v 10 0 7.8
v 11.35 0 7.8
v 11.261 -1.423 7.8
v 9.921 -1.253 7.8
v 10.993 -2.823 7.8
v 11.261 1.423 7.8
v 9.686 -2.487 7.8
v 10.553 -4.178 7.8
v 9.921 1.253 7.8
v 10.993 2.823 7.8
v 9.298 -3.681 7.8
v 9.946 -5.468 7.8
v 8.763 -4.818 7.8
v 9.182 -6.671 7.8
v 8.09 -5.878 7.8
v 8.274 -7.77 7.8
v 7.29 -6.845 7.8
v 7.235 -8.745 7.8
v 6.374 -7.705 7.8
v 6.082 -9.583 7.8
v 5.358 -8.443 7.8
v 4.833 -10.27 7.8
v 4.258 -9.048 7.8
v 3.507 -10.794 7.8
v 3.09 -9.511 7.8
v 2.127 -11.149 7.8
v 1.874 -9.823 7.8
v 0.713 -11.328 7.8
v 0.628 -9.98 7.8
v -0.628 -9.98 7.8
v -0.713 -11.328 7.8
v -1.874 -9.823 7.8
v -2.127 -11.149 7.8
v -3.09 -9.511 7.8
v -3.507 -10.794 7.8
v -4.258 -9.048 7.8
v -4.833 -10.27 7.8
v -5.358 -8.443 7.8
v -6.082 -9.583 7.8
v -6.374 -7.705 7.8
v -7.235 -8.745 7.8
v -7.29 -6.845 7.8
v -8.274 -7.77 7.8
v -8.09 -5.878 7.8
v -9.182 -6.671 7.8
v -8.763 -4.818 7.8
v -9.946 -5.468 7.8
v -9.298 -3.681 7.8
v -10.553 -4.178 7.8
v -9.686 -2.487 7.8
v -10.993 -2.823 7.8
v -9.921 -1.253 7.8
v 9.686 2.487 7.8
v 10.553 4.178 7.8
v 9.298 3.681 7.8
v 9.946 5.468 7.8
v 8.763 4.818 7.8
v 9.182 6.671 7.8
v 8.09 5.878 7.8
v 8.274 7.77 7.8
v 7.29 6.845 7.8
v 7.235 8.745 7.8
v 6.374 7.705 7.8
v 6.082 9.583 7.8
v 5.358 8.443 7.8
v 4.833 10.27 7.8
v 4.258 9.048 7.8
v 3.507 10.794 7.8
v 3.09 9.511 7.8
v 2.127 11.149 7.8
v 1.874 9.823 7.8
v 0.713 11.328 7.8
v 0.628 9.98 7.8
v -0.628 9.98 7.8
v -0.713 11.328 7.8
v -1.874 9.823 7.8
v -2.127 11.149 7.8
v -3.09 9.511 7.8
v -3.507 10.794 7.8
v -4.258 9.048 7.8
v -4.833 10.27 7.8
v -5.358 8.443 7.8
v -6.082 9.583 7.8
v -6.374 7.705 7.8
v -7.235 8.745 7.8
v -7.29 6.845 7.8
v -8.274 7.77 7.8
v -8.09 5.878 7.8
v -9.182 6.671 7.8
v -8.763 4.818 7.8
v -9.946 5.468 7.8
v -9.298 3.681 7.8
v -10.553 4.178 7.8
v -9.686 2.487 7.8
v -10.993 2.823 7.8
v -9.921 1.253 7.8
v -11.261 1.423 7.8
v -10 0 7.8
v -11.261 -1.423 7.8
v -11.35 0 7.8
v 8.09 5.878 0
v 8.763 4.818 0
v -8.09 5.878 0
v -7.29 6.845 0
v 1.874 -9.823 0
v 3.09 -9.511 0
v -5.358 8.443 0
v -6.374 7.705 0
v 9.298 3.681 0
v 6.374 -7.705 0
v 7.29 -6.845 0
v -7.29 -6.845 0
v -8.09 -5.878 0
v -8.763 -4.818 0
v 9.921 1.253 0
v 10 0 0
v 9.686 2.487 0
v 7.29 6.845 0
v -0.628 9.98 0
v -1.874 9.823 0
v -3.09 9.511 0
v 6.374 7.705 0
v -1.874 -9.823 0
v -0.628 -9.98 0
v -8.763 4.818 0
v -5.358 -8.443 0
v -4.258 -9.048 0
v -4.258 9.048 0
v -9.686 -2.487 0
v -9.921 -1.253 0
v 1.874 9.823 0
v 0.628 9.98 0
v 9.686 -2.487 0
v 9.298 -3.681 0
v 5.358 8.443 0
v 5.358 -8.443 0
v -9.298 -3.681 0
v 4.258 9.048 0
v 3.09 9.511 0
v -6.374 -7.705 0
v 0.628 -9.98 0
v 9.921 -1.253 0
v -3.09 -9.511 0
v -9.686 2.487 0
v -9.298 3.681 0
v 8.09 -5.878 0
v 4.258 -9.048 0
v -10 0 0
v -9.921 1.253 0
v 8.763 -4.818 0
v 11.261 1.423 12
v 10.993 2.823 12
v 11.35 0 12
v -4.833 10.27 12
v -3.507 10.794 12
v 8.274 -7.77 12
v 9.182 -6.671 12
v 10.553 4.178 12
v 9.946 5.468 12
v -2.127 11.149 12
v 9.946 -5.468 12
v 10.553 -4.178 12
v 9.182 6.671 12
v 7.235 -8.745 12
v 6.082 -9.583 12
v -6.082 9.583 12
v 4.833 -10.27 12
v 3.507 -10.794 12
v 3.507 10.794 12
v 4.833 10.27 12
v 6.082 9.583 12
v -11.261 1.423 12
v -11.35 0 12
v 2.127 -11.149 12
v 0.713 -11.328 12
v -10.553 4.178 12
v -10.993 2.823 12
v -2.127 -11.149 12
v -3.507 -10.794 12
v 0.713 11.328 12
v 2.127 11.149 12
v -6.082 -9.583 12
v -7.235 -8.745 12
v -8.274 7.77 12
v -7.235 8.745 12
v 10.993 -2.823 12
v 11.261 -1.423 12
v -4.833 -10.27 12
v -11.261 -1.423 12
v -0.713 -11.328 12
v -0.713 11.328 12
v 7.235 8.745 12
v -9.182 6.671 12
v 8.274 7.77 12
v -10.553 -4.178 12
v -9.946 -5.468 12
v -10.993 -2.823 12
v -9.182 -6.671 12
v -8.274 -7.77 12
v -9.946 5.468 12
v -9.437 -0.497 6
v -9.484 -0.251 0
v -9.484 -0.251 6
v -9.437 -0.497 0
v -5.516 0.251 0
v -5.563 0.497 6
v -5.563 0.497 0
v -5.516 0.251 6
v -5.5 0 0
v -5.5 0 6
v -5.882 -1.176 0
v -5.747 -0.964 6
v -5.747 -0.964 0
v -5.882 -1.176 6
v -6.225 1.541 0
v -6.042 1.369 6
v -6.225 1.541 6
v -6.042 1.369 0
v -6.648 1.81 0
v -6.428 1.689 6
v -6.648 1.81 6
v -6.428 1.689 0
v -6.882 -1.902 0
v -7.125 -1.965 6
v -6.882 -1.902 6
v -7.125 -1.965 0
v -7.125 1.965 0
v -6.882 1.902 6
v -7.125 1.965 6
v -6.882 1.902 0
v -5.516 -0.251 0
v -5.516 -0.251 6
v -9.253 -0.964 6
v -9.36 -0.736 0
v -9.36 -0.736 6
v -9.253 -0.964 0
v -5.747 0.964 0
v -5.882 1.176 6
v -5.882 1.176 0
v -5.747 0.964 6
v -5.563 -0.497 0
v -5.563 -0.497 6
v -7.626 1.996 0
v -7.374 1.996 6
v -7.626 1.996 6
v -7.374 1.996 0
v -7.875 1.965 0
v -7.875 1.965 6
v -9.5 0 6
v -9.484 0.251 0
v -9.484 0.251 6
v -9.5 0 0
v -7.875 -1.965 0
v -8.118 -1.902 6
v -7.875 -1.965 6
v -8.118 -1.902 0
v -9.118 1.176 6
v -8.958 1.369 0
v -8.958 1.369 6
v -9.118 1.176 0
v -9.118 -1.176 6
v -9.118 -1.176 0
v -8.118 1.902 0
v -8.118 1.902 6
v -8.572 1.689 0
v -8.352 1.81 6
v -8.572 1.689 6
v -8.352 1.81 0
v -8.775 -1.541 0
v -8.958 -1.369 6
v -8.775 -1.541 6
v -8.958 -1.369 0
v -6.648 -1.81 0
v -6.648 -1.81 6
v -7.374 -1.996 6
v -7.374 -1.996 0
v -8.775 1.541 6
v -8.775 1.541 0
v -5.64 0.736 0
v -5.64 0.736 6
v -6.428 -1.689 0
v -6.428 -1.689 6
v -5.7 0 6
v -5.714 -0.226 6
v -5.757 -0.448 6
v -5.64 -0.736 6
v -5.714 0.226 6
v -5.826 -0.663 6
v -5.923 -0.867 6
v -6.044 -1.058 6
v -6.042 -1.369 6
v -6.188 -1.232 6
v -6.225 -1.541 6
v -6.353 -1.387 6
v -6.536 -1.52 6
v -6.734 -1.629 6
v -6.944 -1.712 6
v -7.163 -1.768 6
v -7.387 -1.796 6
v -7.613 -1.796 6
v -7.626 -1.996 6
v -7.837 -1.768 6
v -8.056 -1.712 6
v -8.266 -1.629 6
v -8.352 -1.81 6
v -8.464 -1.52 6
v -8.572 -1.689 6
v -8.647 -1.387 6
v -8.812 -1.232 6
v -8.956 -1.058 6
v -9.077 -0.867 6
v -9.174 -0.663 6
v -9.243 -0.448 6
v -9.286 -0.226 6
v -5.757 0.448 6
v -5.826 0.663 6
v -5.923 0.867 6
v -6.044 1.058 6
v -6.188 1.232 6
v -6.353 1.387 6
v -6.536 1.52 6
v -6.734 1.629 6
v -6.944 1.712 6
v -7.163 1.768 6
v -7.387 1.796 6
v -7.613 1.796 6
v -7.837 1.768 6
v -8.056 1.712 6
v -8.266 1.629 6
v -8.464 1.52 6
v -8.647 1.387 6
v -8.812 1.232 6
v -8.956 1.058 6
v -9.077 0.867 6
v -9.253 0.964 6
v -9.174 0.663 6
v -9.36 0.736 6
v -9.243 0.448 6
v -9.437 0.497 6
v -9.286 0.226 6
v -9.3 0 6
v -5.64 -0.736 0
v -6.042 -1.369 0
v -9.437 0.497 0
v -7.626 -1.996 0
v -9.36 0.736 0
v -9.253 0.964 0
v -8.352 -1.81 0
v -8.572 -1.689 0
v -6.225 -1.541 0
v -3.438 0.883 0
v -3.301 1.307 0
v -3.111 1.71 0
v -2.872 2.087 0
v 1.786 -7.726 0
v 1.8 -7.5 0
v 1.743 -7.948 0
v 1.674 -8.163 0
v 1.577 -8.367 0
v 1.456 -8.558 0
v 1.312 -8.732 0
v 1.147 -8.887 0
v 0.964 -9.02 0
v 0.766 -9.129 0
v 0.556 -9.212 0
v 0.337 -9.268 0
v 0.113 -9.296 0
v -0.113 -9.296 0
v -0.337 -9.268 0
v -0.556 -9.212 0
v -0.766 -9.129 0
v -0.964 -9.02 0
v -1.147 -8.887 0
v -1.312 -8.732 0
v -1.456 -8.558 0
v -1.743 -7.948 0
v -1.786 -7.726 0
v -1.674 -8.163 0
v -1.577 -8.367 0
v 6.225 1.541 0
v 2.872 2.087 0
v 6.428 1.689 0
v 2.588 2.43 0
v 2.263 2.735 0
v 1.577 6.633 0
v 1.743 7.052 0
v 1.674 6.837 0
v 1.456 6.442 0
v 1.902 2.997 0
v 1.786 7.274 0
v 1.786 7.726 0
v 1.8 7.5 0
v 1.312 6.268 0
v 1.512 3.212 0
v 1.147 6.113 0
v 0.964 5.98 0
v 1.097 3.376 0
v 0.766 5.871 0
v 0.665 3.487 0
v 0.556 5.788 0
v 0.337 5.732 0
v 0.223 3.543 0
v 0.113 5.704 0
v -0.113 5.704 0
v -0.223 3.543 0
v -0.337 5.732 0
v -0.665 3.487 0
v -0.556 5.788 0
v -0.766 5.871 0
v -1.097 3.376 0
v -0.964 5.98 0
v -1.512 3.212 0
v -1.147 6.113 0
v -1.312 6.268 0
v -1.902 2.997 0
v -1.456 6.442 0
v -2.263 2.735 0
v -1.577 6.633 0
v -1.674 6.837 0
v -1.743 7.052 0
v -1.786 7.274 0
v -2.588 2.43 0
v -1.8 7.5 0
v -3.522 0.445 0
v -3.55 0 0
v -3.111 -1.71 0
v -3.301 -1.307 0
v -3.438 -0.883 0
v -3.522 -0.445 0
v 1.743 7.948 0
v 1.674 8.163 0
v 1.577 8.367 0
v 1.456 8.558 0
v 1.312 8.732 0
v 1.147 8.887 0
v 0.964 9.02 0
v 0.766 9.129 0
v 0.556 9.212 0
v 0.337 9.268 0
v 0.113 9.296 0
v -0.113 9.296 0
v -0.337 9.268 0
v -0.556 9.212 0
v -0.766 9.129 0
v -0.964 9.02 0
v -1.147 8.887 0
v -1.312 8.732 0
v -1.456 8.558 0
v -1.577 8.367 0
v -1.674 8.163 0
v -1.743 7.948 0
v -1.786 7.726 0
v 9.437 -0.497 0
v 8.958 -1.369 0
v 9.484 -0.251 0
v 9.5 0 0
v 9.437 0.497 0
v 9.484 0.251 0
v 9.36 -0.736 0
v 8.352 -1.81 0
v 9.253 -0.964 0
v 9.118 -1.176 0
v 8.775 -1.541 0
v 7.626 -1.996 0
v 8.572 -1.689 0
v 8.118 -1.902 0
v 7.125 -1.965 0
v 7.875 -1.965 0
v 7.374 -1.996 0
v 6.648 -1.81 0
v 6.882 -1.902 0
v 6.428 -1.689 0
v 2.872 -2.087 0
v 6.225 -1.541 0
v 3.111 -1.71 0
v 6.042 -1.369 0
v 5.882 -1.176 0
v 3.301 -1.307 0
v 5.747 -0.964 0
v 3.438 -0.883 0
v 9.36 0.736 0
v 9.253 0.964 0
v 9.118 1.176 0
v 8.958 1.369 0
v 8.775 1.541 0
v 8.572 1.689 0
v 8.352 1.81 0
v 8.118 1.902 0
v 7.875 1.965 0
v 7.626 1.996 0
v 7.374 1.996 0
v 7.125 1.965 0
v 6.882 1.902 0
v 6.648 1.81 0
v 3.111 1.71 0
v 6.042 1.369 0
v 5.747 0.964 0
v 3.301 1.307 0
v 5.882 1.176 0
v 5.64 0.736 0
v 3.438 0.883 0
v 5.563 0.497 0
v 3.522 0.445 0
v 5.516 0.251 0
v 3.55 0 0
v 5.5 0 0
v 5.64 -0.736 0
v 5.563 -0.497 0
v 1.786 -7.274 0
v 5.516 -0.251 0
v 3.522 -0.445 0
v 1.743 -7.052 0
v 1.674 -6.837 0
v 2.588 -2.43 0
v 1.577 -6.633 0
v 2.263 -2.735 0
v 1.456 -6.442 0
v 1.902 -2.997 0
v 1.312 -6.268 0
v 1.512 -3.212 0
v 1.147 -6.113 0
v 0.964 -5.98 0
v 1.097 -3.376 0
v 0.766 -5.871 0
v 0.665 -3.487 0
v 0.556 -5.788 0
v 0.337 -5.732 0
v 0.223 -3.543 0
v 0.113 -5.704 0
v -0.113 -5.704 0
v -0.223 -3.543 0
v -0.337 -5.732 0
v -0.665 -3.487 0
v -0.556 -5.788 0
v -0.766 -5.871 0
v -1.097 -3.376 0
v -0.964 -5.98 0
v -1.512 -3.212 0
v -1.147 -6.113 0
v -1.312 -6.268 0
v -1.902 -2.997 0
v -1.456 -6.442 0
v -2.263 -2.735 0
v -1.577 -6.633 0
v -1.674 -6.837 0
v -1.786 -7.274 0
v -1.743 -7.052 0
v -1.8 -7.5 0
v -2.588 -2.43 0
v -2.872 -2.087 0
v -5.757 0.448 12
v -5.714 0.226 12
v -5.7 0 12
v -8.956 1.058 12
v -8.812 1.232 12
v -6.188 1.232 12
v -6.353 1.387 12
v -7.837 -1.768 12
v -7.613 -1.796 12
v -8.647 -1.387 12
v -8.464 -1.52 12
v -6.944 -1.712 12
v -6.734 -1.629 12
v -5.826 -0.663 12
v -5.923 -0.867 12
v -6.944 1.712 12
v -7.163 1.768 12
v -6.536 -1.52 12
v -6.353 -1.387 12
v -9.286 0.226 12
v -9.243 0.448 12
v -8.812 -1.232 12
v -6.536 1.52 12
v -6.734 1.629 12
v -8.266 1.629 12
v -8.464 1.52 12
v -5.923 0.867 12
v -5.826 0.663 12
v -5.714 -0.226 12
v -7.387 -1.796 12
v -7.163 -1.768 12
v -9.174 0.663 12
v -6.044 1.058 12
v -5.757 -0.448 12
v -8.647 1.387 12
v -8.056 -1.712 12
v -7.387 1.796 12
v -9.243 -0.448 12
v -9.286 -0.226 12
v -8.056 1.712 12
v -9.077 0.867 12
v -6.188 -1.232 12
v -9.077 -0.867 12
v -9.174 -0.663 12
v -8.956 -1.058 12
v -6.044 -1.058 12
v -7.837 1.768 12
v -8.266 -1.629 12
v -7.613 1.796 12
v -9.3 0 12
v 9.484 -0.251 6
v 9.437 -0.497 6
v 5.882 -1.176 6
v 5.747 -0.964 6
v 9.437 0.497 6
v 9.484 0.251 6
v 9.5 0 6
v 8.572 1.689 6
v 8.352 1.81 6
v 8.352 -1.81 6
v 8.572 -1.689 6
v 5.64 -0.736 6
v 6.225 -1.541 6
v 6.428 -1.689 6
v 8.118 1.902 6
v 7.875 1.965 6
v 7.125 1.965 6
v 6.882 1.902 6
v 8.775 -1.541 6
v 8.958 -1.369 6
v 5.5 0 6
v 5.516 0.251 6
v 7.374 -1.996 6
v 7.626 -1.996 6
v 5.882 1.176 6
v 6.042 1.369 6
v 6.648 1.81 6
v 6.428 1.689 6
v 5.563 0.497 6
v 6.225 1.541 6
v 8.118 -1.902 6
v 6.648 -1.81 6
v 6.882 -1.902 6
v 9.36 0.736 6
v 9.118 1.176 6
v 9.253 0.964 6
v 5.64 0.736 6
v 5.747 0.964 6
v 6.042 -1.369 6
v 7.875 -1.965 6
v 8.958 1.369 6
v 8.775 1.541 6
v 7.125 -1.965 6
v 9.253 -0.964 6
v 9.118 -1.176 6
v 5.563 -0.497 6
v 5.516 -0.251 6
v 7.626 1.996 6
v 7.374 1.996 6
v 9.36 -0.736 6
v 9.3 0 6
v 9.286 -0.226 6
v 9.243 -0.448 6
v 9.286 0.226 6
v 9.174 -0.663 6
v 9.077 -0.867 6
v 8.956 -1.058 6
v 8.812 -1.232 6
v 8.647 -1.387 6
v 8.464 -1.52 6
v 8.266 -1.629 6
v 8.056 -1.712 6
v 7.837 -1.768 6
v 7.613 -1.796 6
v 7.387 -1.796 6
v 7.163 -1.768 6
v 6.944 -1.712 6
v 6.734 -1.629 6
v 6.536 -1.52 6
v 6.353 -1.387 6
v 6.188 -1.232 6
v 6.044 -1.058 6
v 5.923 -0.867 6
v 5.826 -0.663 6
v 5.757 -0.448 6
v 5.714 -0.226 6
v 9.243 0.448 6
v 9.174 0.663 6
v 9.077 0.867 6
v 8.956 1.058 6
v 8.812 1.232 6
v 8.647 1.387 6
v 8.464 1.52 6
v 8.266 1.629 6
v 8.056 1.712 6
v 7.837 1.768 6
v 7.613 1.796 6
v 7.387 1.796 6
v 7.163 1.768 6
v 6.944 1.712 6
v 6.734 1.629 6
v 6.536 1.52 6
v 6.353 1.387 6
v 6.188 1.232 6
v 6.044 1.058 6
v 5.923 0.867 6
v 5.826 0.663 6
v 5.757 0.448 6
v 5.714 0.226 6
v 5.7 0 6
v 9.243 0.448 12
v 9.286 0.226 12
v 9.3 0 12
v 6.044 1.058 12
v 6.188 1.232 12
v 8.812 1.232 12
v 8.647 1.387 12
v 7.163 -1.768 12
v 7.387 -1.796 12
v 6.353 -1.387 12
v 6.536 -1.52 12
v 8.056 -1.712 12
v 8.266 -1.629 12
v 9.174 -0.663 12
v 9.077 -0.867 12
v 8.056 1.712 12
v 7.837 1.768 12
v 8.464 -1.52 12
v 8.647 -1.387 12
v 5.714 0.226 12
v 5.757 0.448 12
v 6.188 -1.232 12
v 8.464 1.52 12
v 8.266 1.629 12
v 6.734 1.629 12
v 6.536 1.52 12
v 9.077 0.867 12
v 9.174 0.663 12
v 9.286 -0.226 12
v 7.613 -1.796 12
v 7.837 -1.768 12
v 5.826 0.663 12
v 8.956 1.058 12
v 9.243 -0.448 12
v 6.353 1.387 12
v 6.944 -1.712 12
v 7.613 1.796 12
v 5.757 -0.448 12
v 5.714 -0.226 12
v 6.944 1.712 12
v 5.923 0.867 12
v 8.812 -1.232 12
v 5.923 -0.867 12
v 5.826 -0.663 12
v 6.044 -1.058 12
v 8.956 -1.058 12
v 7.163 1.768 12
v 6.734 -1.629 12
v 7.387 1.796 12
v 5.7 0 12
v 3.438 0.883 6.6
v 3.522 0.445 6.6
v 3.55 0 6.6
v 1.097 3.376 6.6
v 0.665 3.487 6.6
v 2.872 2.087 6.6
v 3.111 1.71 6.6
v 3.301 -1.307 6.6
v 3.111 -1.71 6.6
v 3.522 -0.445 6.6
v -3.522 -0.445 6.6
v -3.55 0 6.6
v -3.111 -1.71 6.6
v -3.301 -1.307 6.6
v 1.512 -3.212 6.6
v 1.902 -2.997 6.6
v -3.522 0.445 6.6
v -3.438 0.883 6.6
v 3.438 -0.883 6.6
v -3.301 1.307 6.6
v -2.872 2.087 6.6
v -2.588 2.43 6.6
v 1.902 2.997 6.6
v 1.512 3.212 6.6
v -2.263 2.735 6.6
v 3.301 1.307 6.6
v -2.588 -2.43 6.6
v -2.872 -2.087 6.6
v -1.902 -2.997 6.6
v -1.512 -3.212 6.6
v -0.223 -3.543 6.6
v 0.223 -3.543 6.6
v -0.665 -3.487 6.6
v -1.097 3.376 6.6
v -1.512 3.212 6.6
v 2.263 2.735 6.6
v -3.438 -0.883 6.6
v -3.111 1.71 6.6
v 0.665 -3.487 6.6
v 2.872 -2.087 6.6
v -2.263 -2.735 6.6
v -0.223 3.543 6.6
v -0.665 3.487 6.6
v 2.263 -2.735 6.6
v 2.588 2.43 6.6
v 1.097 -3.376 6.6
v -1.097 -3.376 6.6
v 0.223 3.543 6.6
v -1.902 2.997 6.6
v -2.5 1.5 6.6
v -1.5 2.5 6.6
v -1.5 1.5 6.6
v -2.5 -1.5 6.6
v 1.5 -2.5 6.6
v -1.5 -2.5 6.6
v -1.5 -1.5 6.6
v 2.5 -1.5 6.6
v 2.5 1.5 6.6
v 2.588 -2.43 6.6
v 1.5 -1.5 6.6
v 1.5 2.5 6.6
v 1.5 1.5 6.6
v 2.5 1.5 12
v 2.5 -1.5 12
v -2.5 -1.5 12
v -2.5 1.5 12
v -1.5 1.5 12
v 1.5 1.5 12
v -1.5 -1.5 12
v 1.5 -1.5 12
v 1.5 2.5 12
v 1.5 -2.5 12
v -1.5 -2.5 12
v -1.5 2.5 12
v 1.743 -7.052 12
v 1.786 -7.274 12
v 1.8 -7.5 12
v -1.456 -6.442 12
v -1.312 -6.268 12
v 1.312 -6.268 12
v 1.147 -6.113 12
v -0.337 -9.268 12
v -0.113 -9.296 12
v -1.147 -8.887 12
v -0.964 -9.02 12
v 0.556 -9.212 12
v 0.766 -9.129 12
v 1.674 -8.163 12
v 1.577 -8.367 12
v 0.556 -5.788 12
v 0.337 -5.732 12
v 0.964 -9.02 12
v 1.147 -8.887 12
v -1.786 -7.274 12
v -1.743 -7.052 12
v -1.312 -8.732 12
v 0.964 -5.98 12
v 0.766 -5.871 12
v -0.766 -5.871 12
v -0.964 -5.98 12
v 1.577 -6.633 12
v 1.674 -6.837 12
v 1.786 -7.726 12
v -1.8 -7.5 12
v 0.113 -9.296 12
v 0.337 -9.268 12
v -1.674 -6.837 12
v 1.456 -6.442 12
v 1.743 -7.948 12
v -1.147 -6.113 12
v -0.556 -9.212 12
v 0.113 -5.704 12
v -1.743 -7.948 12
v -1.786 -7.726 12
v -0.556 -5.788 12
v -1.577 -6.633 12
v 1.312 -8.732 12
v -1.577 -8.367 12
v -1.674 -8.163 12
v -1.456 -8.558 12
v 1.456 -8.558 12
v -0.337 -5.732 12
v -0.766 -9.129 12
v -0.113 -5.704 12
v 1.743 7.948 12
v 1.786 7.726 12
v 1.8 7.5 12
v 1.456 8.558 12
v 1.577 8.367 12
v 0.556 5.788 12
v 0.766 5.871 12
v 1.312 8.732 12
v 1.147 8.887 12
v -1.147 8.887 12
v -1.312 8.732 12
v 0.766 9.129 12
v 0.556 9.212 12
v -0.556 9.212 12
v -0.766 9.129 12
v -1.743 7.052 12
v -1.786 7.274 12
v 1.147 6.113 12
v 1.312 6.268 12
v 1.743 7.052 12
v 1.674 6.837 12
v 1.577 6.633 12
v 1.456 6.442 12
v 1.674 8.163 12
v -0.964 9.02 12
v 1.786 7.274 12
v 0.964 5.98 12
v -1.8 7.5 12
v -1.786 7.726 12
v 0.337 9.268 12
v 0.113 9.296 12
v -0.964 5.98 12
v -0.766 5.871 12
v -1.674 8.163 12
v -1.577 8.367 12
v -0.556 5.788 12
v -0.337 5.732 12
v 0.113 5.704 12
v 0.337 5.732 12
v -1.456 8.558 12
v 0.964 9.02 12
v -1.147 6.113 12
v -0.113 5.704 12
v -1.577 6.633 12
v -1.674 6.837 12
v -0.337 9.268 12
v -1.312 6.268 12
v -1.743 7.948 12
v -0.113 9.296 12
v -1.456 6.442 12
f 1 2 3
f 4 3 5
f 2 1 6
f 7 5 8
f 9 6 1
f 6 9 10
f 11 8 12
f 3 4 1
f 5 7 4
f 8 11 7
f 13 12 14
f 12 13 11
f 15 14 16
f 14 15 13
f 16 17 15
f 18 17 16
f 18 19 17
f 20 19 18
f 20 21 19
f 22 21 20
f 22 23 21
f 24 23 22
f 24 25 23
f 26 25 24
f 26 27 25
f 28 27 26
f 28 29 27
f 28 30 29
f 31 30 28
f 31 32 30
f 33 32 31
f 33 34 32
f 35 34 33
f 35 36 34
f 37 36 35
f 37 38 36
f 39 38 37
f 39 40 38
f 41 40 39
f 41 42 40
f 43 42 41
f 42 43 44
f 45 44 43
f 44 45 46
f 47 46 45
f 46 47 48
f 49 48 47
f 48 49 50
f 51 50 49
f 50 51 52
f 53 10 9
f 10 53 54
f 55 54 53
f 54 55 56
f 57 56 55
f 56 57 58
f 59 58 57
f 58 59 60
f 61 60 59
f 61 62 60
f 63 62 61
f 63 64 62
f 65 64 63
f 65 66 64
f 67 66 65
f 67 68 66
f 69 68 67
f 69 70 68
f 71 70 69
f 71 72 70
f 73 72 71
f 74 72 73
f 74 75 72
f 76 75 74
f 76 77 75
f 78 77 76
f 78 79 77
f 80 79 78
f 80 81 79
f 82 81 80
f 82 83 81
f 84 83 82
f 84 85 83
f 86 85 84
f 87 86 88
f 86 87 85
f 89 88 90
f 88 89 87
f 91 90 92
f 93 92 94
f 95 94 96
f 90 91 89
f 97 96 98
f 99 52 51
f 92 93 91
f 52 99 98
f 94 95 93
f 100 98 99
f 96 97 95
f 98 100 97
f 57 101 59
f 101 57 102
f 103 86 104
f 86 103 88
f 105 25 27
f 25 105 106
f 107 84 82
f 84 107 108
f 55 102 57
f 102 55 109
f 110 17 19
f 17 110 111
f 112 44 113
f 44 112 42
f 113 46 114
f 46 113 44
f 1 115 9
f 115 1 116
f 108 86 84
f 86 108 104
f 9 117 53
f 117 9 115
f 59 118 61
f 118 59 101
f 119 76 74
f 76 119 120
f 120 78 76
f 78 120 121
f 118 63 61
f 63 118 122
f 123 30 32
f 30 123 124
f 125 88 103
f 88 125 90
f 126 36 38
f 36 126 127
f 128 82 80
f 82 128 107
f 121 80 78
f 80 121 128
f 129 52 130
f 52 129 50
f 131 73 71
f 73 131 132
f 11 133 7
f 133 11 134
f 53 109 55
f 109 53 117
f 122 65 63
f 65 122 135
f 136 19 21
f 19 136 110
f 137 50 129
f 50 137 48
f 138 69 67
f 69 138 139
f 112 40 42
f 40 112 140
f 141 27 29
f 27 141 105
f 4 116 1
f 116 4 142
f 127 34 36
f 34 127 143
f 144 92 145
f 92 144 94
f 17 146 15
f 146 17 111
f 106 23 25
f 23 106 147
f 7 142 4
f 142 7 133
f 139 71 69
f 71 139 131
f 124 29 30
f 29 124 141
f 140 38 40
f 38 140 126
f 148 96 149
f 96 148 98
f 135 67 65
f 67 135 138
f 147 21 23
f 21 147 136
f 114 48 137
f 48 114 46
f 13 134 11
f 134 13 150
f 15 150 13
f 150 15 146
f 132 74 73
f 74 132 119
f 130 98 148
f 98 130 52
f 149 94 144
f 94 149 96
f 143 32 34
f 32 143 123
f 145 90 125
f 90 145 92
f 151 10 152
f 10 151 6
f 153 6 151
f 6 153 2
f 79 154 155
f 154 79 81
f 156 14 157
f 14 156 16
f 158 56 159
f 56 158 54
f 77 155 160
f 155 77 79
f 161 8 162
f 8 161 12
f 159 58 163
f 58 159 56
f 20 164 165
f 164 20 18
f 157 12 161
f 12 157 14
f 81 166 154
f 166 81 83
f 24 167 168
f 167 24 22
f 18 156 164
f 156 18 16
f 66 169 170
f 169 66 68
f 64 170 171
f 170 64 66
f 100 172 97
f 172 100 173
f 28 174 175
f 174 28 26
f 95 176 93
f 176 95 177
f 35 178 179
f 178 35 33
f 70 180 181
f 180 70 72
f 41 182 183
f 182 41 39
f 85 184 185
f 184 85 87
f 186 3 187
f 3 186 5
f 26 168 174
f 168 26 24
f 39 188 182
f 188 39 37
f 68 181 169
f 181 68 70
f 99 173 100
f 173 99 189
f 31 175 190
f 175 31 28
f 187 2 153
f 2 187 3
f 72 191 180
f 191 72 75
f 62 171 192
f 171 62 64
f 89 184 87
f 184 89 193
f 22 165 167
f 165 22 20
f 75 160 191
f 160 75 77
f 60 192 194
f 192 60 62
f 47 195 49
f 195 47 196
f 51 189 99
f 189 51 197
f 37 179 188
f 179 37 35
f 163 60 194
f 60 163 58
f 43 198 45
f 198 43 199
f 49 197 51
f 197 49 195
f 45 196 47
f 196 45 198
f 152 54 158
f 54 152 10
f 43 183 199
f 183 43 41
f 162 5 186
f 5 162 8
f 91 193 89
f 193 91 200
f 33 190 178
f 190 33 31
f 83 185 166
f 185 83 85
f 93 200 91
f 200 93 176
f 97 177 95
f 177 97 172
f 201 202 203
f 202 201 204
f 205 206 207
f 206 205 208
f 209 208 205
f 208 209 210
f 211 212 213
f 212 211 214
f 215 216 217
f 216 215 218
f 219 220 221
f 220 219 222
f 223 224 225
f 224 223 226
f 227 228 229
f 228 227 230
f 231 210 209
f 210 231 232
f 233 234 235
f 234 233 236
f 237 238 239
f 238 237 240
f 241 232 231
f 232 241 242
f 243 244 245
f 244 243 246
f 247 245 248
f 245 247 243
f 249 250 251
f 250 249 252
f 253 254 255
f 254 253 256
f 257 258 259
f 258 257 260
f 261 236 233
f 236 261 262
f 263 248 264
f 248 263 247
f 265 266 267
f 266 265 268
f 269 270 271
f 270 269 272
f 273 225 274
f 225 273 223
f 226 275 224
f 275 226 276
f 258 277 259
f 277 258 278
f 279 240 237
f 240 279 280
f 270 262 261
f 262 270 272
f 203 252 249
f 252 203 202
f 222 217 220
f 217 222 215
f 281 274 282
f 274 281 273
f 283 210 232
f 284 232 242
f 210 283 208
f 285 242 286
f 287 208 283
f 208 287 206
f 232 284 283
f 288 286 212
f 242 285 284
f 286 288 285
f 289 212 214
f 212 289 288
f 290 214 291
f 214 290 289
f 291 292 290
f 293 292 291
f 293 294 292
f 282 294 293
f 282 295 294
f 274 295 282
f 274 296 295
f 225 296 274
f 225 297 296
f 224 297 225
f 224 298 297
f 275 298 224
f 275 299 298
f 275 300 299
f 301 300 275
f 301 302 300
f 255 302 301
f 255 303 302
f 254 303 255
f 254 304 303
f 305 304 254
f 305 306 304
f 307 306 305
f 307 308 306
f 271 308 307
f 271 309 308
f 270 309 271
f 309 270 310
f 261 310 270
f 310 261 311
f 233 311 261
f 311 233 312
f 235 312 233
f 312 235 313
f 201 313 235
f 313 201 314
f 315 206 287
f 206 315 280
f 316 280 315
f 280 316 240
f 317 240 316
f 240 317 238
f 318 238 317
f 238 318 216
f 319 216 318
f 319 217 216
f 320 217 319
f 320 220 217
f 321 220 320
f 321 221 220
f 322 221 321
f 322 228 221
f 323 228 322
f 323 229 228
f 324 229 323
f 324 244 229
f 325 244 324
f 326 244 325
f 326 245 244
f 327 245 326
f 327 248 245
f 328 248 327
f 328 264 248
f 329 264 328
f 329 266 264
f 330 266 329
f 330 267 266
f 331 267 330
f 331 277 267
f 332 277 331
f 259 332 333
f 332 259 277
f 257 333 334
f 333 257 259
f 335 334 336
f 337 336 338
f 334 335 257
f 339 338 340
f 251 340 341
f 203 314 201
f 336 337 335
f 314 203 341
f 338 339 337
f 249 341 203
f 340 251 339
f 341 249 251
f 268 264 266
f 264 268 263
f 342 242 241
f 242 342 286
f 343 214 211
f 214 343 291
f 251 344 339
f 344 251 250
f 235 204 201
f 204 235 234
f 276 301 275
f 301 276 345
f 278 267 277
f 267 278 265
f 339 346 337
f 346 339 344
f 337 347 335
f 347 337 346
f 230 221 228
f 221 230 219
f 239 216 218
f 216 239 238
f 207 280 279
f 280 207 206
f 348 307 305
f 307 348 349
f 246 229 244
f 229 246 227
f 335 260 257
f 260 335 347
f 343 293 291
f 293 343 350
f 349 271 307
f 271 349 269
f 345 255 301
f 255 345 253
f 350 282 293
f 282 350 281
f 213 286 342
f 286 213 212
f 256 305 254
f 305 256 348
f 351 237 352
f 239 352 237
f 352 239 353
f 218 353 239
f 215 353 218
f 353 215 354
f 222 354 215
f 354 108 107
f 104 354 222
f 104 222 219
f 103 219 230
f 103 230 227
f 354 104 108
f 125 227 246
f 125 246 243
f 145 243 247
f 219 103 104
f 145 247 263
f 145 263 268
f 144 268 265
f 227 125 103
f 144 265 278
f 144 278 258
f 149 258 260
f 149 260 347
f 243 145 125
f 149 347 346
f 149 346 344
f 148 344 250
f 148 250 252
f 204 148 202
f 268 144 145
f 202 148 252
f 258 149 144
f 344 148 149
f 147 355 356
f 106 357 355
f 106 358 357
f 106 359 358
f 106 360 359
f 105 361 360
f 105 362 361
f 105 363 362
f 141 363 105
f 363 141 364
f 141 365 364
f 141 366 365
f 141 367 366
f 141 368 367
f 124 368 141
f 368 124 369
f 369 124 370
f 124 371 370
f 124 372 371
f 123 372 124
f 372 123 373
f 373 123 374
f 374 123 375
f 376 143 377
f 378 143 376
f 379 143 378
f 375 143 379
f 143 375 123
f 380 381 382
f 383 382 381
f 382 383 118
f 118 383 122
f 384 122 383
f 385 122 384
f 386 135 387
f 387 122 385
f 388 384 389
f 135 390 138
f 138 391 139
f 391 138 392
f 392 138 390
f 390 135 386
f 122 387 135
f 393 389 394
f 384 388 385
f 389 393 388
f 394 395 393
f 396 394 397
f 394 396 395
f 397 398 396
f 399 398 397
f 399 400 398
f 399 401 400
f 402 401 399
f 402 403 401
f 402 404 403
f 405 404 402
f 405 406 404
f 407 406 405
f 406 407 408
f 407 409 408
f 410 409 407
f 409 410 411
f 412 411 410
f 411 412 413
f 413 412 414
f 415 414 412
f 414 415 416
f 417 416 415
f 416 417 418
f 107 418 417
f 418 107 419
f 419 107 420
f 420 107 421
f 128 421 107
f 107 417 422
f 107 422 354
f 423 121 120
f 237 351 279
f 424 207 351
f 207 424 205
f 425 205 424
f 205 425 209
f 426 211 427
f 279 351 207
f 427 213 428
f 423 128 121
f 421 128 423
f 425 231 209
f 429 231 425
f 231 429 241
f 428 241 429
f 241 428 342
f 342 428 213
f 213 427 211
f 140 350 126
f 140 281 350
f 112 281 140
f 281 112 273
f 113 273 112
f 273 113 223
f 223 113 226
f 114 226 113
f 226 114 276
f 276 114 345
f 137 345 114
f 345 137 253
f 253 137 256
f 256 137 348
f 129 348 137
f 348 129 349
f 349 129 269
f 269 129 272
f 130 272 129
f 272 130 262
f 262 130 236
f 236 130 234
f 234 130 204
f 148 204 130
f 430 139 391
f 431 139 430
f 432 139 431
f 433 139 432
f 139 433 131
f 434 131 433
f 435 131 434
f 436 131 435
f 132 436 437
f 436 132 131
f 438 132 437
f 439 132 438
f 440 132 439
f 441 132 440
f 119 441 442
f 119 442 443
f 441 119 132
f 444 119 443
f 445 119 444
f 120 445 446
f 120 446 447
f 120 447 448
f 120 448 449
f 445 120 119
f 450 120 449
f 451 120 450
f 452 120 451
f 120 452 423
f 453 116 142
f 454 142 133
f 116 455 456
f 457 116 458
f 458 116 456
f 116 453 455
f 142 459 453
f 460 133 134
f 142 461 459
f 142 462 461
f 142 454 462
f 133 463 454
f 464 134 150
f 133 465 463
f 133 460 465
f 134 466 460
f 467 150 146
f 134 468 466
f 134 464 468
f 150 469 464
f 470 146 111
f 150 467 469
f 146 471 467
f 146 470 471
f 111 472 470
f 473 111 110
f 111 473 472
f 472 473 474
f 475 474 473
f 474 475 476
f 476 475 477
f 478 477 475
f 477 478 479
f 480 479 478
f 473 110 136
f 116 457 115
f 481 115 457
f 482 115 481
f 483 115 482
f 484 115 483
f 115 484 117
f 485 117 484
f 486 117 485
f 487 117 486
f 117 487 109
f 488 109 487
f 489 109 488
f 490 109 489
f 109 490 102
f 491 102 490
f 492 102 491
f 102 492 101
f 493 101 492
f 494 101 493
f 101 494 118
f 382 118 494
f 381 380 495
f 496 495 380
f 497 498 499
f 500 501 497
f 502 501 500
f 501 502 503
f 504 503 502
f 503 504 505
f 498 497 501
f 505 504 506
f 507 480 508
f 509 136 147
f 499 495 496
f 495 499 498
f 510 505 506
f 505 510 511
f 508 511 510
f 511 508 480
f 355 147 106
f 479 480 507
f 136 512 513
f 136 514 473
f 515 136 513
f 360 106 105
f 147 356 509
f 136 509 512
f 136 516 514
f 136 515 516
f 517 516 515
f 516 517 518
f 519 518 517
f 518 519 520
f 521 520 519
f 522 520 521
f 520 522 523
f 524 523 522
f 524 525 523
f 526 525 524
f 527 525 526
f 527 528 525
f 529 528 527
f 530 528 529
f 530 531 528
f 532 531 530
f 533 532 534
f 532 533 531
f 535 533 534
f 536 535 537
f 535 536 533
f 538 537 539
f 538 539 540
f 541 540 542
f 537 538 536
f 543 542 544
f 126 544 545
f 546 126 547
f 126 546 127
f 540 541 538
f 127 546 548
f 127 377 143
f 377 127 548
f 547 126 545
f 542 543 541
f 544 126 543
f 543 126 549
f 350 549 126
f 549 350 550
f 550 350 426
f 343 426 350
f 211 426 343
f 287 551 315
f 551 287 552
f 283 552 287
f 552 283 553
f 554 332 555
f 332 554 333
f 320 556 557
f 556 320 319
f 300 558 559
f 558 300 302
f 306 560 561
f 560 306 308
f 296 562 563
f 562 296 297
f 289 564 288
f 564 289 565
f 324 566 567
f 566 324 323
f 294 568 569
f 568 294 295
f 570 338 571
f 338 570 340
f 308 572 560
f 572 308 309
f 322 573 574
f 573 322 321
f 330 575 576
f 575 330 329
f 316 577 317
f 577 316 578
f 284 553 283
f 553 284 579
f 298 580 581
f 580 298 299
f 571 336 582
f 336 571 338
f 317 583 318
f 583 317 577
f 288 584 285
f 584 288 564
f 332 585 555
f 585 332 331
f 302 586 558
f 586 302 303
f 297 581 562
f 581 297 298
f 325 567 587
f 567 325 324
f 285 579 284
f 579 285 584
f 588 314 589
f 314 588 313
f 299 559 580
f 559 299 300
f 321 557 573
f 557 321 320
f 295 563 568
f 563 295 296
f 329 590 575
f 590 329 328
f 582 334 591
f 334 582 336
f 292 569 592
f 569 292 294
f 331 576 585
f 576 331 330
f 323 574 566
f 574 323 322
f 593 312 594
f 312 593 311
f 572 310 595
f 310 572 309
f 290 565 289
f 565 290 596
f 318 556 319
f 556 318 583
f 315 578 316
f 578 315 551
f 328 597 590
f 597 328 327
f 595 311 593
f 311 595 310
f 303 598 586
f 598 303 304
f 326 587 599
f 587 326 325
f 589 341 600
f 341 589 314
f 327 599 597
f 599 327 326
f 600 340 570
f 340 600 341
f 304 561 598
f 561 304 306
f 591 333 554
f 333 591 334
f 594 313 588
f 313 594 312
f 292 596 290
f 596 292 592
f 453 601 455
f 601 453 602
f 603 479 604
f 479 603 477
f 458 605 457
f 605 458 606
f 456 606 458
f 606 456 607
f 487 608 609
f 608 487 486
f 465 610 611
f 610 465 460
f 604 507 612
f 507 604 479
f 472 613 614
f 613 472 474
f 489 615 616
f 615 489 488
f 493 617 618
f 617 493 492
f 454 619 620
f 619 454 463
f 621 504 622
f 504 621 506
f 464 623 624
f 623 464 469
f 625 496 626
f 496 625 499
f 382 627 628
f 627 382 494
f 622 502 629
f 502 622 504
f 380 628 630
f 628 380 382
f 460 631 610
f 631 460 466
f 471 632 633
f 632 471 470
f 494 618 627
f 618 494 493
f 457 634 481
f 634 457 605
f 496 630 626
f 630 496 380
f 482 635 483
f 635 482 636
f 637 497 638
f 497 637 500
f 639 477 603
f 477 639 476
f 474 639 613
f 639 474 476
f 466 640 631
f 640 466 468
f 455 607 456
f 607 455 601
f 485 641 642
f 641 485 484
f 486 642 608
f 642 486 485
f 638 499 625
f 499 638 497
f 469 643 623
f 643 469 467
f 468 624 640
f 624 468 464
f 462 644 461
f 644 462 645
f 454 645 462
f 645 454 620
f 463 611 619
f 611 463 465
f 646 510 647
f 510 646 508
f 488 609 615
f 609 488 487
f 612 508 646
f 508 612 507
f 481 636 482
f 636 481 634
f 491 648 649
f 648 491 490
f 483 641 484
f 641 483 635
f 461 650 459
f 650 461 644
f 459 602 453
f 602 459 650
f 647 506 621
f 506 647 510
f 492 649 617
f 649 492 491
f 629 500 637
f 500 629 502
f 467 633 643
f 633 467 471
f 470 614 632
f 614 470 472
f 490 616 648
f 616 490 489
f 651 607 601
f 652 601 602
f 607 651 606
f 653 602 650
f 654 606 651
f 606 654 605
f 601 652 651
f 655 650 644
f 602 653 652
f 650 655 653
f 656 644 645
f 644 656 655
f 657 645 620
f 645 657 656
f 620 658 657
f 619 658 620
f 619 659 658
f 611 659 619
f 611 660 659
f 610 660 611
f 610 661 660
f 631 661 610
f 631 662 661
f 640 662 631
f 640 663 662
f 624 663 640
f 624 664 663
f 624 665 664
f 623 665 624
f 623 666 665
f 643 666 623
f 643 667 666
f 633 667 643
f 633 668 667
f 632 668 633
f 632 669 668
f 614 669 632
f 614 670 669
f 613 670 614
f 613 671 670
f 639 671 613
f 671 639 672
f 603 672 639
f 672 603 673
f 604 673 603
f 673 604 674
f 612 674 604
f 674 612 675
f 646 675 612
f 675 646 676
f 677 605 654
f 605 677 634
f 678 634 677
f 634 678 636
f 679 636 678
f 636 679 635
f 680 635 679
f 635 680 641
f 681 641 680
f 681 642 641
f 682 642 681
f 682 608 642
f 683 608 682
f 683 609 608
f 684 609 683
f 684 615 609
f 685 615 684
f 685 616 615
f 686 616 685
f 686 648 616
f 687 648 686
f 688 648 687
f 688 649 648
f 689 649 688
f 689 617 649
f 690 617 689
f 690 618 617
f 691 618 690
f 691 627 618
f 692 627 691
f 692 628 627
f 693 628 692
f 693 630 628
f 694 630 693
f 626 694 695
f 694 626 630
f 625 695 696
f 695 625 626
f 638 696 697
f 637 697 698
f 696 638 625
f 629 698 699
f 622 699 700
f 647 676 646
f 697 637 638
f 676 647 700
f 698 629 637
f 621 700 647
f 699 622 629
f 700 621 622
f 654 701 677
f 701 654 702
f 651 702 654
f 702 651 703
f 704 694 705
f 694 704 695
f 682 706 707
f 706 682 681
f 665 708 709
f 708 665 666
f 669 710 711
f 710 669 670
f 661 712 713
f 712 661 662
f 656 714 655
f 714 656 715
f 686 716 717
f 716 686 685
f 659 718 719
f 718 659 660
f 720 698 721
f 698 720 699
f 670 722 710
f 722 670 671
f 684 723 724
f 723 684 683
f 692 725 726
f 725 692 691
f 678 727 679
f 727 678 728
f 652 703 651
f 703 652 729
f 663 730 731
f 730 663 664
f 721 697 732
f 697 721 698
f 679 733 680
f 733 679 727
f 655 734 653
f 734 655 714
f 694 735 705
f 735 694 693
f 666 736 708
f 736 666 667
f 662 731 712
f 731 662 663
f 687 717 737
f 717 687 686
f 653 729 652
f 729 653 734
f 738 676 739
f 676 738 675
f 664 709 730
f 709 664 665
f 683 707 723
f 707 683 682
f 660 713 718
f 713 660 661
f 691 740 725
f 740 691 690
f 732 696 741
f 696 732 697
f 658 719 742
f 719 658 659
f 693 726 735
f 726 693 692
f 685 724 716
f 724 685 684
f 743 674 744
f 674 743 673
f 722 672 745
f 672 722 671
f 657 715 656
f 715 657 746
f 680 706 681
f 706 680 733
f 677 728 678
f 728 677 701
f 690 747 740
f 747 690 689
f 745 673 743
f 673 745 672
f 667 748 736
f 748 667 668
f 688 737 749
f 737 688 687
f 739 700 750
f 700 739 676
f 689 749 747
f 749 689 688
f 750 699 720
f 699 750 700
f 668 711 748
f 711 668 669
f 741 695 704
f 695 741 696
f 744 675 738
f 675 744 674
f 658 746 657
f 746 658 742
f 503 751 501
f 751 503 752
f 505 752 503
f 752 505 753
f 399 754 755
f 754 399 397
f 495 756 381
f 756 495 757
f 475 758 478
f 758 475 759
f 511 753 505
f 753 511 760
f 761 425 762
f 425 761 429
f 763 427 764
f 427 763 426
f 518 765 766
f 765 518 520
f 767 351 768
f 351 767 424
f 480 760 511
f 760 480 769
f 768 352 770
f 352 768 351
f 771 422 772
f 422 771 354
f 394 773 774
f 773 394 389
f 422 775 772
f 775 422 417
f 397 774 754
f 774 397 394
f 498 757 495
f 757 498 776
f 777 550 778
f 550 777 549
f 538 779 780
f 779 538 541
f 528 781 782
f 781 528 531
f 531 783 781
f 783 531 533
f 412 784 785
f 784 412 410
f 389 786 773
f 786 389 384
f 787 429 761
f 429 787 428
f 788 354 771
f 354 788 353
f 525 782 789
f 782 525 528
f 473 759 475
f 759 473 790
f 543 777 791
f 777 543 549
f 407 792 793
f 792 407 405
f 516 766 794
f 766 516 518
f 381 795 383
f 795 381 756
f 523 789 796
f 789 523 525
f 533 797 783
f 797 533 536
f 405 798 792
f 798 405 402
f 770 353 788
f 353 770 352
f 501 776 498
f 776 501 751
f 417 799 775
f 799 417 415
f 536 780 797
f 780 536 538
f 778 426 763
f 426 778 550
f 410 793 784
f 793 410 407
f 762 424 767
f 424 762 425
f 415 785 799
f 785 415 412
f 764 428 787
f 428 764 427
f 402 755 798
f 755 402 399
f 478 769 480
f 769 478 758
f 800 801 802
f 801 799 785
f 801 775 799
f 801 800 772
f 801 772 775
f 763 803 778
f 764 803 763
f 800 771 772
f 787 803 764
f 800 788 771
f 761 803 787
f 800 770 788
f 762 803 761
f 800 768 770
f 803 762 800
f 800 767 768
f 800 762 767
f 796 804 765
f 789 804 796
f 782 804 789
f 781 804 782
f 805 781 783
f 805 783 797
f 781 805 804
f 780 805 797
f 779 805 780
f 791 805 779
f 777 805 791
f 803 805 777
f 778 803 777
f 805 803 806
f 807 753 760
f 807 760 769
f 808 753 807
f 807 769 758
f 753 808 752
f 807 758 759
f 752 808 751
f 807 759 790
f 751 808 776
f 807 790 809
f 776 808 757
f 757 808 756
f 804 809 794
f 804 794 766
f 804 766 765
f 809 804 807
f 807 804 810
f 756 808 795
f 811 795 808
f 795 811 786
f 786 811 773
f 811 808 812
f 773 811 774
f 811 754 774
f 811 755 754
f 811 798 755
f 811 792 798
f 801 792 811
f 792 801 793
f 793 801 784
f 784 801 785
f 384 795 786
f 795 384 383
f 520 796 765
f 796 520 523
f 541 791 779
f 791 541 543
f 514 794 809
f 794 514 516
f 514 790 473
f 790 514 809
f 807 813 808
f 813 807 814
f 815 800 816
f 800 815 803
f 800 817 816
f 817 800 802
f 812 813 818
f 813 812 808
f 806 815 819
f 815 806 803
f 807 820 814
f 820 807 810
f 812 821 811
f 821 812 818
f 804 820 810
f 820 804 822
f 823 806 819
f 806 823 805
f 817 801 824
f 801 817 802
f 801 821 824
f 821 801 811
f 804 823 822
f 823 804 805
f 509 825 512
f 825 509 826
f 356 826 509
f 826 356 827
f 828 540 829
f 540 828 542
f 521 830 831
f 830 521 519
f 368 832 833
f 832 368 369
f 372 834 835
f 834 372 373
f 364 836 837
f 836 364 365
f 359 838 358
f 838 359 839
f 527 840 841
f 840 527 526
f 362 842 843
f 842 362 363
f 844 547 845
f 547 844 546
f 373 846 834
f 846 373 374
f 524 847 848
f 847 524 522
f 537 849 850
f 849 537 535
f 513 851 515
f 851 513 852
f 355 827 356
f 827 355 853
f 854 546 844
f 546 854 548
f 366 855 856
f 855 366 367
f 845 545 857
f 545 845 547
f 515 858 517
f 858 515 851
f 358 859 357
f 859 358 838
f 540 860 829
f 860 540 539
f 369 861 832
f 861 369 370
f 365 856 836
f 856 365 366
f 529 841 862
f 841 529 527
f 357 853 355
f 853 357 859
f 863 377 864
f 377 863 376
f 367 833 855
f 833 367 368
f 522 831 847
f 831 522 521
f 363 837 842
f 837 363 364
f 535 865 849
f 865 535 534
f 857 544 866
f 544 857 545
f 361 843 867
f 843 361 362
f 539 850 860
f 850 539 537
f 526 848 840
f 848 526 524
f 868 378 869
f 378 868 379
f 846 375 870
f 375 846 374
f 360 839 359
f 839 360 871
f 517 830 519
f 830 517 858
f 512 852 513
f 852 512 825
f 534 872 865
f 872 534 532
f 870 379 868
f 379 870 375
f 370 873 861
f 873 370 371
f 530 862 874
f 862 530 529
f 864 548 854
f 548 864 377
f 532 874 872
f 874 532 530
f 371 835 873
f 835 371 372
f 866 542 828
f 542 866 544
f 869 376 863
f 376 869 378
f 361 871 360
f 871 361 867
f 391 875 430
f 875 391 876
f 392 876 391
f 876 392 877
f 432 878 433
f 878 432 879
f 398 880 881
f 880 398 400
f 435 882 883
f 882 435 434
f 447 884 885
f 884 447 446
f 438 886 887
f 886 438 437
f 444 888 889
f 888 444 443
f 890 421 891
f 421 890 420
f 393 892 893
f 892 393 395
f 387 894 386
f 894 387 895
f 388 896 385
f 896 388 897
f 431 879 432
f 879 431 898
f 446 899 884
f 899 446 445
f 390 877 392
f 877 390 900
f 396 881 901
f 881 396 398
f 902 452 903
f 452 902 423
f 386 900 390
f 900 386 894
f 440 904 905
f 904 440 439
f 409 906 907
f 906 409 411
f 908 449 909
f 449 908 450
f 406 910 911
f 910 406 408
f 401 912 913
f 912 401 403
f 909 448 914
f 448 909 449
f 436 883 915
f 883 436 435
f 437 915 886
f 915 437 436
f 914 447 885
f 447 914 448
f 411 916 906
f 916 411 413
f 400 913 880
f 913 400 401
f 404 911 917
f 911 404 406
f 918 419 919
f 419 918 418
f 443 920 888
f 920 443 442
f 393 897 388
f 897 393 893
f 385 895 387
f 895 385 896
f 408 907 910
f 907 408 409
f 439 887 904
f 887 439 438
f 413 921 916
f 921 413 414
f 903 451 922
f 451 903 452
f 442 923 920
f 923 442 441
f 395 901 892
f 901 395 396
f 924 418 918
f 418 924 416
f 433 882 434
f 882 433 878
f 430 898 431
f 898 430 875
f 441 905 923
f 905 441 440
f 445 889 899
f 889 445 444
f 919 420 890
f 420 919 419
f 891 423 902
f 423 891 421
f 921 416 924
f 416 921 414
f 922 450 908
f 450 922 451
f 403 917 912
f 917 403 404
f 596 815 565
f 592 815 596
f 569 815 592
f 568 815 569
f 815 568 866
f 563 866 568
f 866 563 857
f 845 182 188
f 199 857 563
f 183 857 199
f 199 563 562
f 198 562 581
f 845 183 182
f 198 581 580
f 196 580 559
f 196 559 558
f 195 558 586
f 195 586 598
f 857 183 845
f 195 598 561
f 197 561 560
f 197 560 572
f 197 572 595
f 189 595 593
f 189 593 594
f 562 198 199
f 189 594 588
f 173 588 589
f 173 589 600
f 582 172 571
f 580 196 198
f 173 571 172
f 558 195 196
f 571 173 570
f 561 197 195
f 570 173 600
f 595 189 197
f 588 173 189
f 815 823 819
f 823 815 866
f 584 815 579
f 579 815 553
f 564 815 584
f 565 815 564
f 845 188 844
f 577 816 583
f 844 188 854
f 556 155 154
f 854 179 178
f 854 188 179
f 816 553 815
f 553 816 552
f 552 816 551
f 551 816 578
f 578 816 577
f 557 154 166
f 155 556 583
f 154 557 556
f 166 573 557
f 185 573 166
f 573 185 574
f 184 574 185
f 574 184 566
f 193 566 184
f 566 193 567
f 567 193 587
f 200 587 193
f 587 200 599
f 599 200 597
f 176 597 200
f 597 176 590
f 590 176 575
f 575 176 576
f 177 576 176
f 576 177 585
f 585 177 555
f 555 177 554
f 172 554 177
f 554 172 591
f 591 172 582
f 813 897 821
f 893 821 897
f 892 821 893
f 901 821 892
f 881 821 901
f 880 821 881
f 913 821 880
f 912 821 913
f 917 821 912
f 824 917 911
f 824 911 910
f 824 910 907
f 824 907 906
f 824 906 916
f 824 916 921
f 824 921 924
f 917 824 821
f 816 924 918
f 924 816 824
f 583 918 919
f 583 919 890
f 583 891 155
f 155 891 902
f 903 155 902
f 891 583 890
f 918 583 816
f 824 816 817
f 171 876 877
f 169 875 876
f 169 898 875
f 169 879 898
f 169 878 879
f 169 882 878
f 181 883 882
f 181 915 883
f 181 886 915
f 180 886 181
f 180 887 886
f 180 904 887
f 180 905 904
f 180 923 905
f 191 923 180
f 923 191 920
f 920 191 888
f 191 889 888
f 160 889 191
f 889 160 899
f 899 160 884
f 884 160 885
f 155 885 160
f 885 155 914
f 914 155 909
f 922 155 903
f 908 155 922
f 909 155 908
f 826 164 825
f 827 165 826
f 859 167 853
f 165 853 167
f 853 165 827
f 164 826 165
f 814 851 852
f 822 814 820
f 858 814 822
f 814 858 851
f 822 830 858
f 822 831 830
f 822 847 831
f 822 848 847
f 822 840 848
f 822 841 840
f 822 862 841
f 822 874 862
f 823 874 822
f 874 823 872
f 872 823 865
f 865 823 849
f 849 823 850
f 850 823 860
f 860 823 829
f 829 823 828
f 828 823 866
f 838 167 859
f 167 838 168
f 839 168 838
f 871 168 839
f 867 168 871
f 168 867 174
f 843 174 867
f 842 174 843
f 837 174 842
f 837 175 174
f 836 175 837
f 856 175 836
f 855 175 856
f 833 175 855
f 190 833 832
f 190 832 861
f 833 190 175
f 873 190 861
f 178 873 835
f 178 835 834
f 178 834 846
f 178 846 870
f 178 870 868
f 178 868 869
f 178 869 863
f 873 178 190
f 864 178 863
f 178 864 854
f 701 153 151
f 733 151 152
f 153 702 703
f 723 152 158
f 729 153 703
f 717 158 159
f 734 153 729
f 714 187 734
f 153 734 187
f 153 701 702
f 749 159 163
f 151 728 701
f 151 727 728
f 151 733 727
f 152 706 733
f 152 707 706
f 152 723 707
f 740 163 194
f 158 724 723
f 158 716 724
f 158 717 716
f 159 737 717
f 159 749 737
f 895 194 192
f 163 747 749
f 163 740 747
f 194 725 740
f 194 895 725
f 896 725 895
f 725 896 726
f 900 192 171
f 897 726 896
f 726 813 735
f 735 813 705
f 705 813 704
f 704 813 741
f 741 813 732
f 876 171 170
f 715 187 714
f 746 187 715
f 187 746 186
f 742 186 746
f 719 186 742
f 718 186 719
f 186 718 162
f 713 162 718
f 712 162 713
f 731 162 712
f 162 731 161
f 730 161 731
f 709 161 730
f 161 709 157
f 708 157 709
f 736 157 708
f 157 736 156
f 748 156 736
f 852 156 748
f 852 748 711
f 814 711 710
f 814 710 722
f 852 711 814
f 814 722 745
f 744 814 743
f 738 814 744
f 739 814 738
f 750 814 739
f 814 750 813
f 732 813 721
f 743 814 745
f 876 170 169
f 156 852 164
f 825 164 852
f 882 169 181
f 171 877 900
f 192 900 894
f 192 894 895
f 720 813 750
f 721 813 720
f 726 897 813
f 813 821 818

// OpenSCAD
$fn = 50;

difference() {
	union() {
		translate(v = [0, 0, 0]) {
			rotate(a = [0, 0, 0]) {
				difference() {
					union() {
						translate(v = [0, 0, 6.0]) {
							rotate(a = [0, 0, 0]) {
								difference() {
									union() {
										translate(v = [0, 0, -6.0]) {
											cylinder(h = 12, r = 12);
										}
									}
									union() {
										translate(v = [0, 0, 0]) {
											rotate(a = [0, 0, 0]) {
												difference() {
													union() {
														translate(v = [0, 0, -1.8]) {
															cylinder(h = 3.6, r = 13.7);
														}
													}
													union() {
														translate(v = [0, 0, -1.81]) {
															cylinder(h = 3.62, r = 10.0);
														}
													}
												}
											}
										}
										translate(v = [0, 0, -3]) {
											rotate(a = [0, 0, 0]) {
												difference() {
													union() {
														translate(v = [0, 0, -1.8]) {
															cylinder(h = 3.6, r = 13.7);
														}
													}
													union() {
														translate(v = [0, 0, -1.81]) {
															cylinder(h = 3.62, r = 10.0);
														}
													}
												}
											}
										}
										translate(v = [0, 0, -6]) {
											rotate(a = [0, 0, 0]) {
												difference() {
													union() {
														translate(v = [0, 0, -1.8]) {
															cylinder(h = 3.6, r = 13.7);
														}
													}
													union() {
														translate(v = [0, 0, -1.81]) {
															cylinder(h = 3.62, r = 10.0);
														}
													}
												}
											}
										}
										translate(v = [0, 0, 0]) {
											rotate(a = [0, 0, 0]) {
												difference() {
													union() {
														translate(v = [0, 0, -21.0]) {
															cylinder(h = 42, r = 12.35);
														}
													}
													union() {
														translate(v = [0, 0, -21.01]) {
															cylinder(h = 42.02, r = 11.35);
														}
													}
												}
											}
										}
										translate(v = [-7.5, 0, -6.0]) {
											cylinder(h = 6, r = 2.0);
										}
										translate(v = [-7.5, 0, -7.0]) {
											cylinder(h = 14, r = 1.8);
										}
										translate(v = [7.5, 0, -6.0]) {
											cylinder(h = 6, r = 2.0);
										}
										translate(v = [7.5, 0, -7.0]) {
											cylinder(h = 14, r = 1.8);
										}
										translate(v = [0, 0, -6.000000000000001]) {
											cylinder(h = 6.6, r = 3.55);
										}
										translate(v = [-2.5, -1.5, -7.0]) {
											cube(size = [5, 3, 14]);
										}
										translate(v = [-1.5, -2.5, -7.0]) {
											cube(size = [3, 5, 14]);
										}
										translate(v = [0.0, -7.5, -7.0]) {
											cylinder(h = 14, r = 1.8);
										}
										translate(v = [0.0, 7.5, -7.0]) {
											cylinder(h = 14, r = 1.8);
										}
									}
								}
							}
						}
					}
					union();
				}
			}
		}
	}
	union();
}
